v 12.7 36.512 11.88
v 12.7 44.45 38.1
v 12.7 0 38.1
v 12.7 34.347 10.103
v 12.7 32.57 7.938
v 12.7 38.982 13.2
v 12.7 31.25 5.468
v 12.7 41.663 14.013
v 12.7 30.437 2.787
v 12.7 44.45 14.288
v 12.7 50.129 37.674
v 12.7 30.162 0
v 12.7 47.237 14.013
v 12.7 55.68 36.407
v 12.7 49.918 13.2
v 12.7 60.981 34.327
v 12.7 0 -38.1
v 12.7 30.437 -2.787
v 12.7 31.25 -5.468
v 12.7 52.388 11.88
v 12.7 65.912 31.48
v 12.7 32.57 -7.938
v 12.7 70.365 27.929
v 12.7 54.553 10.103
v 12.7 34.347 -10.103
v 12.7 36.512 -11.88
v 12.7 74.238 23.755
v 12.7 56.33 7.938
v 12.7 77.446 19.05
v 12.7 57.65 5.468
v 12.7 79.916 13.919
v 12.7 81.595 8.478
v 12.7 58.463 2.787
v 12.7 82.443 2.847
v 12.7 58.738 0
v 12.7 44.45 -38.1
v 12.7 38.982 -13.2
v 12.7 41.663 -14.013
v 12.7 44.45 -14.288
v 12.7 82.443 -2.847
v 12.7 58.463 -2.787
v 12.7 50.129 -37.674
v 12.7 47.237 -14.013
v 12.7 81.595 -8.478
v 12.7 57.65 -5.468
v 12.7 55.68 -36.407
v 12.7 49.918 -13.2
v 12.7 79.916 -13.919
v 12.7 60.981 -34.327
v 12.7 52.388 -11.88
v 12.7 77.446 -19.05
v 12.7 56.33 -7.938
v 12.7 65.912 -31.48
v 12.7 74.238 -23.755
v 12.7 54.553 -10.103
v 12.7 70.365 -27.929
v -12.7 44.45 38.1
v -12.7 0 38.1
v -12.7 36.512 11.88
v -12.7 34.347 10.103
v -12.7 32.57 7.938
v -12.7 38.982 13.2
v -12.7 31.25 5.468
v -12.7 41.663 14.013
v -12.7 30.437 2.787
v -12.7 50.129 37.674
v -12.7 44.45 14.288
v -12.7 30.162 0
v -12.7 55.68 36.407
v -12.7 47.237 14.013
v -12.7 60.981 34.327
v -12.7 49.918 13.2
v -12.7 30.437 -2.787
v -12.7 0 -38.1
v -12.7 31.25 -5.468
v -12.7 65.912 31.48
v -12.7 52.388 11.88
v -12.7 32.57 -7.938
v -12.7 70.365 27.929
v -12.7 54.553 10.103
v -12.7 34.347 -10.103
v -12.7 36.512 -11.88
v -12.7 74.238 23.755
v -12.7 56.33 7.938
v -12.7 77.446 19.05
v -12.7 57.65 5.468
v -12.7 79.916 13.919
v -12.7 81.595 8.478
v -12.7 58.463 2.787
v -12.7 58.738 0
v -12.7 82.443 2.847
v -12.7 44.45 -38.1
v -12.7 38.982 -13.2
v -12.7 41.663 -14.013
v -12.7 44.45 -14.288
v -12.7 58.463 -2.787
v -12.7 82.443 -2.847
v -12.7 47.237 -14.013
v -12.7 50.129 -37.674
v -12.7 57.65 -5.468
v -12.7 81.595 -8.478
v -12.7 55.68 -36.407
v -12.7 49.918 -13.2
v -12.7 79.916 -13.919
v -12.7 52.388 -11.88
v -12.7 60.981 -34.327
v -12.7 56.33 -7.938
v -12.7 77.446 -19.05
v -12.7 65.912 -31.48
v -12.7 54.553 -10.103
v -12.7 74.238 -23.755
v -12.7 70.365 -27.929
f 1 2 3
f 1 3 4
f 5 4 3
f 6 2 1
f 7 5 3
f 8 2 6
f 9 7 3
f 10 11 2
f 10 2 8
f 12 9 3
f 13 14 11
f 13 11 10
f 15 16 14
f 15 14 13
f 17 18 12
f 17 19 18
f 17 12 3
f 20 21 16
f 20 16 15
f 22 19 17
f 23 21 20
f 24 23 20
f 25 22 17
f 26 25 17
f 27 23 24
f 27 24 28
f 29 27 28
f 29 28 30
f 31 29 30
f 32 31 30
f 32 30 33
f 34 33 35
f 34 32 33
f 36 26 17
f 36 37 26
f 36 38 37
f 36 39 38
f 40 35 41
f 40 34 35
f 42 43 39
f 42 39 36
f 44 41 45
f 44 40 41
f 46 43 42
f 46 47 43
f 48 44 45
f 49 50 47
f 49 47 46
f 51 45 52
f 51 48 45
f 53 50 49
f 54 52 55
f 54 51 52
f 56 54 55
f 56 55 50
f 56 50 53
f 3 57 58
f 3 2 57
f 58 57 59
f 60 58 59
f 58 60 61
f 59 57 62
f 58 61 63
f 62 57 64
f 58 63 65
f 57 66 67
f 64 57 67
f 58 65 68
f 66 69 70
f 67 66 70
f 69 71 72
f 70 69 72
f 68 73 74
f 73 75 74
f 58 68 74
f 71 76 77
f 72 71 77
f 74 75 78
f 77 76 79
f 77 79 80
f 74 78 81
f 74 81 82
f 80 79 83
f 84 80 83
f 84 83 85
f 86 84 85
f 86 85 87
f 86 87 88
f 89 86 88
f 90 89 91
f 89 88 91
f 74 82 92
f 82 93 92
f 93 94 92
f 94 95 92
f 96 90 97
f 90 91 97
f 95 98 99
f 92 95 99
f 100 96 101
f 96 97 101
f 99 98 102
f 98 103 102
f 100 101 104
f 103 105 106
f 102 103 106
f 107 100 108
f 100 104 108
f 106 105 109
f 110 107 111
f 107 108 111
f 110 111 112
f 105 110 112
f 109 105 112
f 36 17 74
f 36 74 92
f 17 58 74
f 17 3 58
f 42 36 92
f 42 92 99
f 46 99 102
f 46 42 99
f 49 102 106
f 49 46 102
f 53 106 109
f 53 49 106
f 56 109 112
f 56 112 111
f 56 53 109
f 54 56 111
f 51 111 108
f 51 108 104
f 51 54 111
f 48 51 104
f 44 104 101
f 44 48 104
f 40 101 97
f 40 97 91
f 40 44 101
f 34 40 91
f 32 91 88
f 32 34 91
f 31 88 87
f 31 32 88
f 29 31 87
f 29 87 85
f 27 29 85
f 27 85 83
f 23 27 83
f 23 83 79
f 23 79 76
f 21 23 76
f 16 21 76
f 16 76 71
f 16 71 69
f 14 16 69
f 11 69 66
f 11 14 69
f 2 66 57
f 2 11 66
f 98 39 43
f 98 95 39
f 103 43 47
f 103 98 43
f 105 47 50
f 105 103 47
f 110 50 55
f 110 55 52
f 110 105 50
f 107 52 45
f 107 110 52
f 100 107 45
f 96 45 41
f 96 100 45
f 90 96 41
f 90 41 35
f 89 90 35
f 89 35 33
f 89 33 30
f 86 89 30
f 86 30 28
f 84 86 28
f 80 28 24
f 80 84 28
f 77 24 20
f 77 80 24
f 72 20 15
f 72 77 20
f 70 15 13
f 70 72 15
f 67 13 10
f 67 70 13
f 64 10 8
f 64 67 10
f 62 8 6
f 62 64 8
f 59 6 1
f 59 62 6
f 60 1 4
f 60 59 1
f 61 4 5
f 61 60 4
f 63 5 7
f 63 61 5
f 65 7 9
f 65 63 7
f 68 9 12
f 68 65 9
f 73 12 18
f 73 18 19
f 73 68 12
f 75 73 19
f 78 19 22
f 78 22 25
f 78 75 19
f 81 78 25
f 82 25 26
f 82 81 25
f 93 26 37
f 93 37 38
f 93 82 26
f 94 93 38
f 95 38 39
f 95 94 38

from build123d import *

# Parameters (mm, degrees)
SKETCH1_R           = 14.2875
BOSS_EXTRUDE1_DEPTH = 12.7


with BuildPart() as part:
    # Sketch1 → Boss-Extrude1 (new body, symmetric)
    with BuildSketch(Plane(origin=(0, 0, 0), x_dir=(0, 0, -1), z_dir=(1, 0, 0))):
        with BuildLine():
            Line((-38.1, 0), (38.1, 0))
            Line((38.1, 0), (38.1, 44.45))
            ThreePointArc((38.1, 44.45), (0, 82.55), (-38.1, 44.45))
            Line((-38.1, 44.45), (-38.1, 0))
        make_face()
        with Locations((0, 44.45)):
            Circle(SKETCH1_R, mode=Mode.SUBTRACT)
    extrude(amount=BOSS_EXTRUDE1_DEPTH, both=True)


solid = part.part
